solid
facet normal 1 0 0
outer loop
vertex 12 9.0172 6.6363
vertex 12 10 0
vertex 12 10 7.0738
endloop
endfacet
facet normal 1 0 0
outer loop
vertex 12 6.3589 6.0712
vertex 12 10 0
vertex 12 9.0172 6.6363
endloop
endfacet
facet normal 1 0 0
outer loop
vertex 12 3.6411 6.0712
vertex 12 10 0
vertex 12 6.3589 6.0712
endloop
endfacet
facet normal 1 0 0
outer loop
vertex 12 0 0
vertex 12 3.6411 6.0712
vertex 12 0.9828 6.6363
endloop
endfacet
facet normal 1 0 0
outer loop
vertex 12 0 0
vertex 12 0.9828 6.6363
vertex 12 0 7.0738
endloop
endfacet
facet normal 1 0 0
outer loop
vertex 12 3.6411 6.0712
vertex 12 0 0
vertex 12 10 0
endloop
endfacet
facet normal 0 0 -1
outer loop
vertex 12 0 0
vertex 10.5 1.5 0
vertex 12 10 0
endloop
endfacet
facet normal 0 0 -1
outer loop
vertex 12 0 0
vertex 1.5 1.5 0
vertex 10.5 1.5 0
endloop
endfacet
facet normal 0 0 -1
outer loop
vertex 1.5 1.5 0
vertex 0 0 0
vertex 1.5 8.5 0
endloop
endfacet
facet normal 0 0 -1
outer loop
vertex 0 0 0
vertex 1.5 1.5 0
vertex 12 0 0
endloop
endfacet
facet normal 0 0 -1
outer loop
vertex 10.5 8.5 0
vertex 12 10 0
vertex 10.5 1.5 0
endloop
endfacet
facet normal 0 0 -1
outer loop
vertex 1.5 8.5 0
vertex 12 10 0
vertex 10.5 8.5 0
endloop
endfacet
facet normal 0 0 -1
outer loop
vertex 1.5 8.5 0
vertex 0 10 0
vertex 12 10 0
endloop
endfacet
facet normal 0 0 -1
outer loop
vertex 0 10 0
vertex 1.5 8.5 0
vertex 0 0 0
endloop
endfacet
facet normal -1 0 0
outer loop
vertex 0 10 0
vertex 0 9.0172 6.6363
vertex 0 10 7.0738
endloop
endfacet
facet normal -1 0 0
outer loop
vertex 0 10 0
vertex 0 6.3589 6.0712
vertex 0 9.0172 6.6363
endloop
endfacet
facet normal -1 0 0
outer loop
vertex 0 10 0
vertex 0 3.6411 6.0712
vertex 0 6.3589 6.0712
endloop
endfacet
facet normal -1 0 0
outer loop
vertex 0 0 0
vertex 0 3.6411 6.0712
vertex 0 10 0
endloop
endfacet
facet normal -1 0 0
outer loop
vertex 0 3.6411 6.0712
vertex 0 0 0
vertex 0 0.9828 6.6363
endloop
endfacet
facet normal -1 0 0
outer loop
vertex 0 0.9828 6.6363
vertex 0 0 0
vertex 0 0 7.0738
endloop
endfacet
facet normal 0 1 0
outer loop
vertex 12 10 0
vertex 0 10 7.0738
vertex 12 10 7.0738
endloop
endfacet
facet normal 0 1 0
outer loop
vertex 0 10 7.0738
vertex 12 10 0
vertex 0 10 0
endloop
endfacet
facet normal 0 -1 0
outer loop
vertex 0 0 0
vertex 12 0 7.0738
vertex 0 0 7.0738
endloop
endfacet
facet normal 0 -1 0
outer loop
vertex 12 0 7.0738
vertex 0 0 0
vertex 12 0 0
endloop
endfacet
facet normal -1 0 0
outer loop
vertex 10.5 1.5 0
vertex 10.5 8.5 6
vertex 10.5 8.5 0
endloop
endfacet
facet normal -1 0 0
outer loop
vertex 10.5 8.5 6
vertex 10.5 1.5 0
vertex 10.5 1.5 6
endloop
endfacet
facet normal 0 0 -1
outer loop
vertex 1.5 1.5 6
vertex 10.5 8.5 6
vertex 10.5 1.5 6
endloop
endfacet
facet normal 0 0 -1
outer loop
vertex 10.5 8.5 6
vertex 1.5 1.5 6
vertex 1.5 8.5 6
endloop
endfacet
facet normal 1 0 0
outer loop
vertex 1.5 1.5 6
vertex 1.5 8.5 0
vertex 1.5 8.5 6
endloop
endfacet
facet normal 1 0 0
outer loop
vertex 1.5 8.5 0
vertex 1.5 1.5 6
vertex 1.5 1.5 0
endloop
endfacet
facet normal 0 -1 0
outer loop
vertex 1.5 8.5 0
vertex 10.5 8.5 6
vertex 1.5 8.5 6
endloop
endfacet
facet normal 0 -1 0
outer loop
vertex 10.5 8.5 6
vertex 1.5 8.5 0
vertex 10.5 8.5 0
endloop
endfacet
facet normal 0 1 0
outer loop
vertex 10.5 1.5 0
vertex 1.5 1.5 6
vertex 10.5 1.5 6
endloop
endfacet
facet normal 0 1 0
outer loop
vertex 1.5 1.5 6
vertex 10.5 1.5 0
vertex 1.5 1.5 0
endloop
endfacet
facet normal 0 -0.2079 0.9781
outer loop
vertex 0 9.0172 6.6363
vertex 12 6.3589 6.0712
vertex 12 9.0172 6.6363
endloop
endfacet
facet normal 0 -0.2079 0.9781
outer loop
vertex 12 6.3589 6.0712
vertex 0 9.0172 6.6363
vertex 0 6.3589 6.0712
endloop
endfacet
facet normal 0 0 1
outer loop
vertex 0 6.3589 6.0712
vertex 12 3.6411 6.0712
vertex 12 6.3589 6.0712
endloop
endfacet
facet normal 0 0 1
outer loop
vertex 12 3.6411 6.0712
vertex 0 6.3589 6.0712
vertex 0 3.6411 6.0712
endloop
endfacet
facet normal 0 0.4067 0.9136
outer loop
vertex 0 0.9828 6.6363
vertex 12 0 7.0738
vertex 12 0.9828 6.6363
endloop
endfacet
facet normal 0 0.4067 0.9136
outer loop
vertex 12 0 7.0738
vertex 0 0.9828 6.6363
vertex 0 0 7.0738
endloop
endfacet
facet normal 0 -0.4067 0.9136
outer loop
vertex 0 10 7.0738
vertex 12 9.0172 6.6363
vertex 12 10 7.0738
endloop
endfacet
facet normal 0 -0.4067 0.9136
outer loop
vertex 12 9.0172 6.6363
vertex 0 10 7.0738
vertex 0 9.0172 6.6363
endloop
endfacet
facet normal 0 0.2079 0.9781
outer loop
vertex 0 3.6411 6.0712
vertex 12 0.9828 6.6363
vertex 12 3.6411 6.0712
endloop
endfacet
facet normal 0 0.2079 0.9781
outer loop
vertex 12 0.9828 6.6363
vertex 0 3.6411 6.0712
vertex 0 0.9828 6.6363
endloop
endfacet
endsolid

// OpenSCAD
h = 10;
w = 12;
d = 9;

// inner box wall thickness
th = 1.5;
// inner box depth
id = 6;

// circle radius
r = 13;


difference() {
    // chimney
    cube([w, h, d]);

    union() {
        // inner cube to remove
        translate([th, th, 0])
        cube([w - 2 * th, h - 2 * th, id]);
    }
    
    union() {
        translate([0, h / 2, id + r])
        rotate([90, 0, 90])
        cylinder(w, r, r);
    }
 
}
